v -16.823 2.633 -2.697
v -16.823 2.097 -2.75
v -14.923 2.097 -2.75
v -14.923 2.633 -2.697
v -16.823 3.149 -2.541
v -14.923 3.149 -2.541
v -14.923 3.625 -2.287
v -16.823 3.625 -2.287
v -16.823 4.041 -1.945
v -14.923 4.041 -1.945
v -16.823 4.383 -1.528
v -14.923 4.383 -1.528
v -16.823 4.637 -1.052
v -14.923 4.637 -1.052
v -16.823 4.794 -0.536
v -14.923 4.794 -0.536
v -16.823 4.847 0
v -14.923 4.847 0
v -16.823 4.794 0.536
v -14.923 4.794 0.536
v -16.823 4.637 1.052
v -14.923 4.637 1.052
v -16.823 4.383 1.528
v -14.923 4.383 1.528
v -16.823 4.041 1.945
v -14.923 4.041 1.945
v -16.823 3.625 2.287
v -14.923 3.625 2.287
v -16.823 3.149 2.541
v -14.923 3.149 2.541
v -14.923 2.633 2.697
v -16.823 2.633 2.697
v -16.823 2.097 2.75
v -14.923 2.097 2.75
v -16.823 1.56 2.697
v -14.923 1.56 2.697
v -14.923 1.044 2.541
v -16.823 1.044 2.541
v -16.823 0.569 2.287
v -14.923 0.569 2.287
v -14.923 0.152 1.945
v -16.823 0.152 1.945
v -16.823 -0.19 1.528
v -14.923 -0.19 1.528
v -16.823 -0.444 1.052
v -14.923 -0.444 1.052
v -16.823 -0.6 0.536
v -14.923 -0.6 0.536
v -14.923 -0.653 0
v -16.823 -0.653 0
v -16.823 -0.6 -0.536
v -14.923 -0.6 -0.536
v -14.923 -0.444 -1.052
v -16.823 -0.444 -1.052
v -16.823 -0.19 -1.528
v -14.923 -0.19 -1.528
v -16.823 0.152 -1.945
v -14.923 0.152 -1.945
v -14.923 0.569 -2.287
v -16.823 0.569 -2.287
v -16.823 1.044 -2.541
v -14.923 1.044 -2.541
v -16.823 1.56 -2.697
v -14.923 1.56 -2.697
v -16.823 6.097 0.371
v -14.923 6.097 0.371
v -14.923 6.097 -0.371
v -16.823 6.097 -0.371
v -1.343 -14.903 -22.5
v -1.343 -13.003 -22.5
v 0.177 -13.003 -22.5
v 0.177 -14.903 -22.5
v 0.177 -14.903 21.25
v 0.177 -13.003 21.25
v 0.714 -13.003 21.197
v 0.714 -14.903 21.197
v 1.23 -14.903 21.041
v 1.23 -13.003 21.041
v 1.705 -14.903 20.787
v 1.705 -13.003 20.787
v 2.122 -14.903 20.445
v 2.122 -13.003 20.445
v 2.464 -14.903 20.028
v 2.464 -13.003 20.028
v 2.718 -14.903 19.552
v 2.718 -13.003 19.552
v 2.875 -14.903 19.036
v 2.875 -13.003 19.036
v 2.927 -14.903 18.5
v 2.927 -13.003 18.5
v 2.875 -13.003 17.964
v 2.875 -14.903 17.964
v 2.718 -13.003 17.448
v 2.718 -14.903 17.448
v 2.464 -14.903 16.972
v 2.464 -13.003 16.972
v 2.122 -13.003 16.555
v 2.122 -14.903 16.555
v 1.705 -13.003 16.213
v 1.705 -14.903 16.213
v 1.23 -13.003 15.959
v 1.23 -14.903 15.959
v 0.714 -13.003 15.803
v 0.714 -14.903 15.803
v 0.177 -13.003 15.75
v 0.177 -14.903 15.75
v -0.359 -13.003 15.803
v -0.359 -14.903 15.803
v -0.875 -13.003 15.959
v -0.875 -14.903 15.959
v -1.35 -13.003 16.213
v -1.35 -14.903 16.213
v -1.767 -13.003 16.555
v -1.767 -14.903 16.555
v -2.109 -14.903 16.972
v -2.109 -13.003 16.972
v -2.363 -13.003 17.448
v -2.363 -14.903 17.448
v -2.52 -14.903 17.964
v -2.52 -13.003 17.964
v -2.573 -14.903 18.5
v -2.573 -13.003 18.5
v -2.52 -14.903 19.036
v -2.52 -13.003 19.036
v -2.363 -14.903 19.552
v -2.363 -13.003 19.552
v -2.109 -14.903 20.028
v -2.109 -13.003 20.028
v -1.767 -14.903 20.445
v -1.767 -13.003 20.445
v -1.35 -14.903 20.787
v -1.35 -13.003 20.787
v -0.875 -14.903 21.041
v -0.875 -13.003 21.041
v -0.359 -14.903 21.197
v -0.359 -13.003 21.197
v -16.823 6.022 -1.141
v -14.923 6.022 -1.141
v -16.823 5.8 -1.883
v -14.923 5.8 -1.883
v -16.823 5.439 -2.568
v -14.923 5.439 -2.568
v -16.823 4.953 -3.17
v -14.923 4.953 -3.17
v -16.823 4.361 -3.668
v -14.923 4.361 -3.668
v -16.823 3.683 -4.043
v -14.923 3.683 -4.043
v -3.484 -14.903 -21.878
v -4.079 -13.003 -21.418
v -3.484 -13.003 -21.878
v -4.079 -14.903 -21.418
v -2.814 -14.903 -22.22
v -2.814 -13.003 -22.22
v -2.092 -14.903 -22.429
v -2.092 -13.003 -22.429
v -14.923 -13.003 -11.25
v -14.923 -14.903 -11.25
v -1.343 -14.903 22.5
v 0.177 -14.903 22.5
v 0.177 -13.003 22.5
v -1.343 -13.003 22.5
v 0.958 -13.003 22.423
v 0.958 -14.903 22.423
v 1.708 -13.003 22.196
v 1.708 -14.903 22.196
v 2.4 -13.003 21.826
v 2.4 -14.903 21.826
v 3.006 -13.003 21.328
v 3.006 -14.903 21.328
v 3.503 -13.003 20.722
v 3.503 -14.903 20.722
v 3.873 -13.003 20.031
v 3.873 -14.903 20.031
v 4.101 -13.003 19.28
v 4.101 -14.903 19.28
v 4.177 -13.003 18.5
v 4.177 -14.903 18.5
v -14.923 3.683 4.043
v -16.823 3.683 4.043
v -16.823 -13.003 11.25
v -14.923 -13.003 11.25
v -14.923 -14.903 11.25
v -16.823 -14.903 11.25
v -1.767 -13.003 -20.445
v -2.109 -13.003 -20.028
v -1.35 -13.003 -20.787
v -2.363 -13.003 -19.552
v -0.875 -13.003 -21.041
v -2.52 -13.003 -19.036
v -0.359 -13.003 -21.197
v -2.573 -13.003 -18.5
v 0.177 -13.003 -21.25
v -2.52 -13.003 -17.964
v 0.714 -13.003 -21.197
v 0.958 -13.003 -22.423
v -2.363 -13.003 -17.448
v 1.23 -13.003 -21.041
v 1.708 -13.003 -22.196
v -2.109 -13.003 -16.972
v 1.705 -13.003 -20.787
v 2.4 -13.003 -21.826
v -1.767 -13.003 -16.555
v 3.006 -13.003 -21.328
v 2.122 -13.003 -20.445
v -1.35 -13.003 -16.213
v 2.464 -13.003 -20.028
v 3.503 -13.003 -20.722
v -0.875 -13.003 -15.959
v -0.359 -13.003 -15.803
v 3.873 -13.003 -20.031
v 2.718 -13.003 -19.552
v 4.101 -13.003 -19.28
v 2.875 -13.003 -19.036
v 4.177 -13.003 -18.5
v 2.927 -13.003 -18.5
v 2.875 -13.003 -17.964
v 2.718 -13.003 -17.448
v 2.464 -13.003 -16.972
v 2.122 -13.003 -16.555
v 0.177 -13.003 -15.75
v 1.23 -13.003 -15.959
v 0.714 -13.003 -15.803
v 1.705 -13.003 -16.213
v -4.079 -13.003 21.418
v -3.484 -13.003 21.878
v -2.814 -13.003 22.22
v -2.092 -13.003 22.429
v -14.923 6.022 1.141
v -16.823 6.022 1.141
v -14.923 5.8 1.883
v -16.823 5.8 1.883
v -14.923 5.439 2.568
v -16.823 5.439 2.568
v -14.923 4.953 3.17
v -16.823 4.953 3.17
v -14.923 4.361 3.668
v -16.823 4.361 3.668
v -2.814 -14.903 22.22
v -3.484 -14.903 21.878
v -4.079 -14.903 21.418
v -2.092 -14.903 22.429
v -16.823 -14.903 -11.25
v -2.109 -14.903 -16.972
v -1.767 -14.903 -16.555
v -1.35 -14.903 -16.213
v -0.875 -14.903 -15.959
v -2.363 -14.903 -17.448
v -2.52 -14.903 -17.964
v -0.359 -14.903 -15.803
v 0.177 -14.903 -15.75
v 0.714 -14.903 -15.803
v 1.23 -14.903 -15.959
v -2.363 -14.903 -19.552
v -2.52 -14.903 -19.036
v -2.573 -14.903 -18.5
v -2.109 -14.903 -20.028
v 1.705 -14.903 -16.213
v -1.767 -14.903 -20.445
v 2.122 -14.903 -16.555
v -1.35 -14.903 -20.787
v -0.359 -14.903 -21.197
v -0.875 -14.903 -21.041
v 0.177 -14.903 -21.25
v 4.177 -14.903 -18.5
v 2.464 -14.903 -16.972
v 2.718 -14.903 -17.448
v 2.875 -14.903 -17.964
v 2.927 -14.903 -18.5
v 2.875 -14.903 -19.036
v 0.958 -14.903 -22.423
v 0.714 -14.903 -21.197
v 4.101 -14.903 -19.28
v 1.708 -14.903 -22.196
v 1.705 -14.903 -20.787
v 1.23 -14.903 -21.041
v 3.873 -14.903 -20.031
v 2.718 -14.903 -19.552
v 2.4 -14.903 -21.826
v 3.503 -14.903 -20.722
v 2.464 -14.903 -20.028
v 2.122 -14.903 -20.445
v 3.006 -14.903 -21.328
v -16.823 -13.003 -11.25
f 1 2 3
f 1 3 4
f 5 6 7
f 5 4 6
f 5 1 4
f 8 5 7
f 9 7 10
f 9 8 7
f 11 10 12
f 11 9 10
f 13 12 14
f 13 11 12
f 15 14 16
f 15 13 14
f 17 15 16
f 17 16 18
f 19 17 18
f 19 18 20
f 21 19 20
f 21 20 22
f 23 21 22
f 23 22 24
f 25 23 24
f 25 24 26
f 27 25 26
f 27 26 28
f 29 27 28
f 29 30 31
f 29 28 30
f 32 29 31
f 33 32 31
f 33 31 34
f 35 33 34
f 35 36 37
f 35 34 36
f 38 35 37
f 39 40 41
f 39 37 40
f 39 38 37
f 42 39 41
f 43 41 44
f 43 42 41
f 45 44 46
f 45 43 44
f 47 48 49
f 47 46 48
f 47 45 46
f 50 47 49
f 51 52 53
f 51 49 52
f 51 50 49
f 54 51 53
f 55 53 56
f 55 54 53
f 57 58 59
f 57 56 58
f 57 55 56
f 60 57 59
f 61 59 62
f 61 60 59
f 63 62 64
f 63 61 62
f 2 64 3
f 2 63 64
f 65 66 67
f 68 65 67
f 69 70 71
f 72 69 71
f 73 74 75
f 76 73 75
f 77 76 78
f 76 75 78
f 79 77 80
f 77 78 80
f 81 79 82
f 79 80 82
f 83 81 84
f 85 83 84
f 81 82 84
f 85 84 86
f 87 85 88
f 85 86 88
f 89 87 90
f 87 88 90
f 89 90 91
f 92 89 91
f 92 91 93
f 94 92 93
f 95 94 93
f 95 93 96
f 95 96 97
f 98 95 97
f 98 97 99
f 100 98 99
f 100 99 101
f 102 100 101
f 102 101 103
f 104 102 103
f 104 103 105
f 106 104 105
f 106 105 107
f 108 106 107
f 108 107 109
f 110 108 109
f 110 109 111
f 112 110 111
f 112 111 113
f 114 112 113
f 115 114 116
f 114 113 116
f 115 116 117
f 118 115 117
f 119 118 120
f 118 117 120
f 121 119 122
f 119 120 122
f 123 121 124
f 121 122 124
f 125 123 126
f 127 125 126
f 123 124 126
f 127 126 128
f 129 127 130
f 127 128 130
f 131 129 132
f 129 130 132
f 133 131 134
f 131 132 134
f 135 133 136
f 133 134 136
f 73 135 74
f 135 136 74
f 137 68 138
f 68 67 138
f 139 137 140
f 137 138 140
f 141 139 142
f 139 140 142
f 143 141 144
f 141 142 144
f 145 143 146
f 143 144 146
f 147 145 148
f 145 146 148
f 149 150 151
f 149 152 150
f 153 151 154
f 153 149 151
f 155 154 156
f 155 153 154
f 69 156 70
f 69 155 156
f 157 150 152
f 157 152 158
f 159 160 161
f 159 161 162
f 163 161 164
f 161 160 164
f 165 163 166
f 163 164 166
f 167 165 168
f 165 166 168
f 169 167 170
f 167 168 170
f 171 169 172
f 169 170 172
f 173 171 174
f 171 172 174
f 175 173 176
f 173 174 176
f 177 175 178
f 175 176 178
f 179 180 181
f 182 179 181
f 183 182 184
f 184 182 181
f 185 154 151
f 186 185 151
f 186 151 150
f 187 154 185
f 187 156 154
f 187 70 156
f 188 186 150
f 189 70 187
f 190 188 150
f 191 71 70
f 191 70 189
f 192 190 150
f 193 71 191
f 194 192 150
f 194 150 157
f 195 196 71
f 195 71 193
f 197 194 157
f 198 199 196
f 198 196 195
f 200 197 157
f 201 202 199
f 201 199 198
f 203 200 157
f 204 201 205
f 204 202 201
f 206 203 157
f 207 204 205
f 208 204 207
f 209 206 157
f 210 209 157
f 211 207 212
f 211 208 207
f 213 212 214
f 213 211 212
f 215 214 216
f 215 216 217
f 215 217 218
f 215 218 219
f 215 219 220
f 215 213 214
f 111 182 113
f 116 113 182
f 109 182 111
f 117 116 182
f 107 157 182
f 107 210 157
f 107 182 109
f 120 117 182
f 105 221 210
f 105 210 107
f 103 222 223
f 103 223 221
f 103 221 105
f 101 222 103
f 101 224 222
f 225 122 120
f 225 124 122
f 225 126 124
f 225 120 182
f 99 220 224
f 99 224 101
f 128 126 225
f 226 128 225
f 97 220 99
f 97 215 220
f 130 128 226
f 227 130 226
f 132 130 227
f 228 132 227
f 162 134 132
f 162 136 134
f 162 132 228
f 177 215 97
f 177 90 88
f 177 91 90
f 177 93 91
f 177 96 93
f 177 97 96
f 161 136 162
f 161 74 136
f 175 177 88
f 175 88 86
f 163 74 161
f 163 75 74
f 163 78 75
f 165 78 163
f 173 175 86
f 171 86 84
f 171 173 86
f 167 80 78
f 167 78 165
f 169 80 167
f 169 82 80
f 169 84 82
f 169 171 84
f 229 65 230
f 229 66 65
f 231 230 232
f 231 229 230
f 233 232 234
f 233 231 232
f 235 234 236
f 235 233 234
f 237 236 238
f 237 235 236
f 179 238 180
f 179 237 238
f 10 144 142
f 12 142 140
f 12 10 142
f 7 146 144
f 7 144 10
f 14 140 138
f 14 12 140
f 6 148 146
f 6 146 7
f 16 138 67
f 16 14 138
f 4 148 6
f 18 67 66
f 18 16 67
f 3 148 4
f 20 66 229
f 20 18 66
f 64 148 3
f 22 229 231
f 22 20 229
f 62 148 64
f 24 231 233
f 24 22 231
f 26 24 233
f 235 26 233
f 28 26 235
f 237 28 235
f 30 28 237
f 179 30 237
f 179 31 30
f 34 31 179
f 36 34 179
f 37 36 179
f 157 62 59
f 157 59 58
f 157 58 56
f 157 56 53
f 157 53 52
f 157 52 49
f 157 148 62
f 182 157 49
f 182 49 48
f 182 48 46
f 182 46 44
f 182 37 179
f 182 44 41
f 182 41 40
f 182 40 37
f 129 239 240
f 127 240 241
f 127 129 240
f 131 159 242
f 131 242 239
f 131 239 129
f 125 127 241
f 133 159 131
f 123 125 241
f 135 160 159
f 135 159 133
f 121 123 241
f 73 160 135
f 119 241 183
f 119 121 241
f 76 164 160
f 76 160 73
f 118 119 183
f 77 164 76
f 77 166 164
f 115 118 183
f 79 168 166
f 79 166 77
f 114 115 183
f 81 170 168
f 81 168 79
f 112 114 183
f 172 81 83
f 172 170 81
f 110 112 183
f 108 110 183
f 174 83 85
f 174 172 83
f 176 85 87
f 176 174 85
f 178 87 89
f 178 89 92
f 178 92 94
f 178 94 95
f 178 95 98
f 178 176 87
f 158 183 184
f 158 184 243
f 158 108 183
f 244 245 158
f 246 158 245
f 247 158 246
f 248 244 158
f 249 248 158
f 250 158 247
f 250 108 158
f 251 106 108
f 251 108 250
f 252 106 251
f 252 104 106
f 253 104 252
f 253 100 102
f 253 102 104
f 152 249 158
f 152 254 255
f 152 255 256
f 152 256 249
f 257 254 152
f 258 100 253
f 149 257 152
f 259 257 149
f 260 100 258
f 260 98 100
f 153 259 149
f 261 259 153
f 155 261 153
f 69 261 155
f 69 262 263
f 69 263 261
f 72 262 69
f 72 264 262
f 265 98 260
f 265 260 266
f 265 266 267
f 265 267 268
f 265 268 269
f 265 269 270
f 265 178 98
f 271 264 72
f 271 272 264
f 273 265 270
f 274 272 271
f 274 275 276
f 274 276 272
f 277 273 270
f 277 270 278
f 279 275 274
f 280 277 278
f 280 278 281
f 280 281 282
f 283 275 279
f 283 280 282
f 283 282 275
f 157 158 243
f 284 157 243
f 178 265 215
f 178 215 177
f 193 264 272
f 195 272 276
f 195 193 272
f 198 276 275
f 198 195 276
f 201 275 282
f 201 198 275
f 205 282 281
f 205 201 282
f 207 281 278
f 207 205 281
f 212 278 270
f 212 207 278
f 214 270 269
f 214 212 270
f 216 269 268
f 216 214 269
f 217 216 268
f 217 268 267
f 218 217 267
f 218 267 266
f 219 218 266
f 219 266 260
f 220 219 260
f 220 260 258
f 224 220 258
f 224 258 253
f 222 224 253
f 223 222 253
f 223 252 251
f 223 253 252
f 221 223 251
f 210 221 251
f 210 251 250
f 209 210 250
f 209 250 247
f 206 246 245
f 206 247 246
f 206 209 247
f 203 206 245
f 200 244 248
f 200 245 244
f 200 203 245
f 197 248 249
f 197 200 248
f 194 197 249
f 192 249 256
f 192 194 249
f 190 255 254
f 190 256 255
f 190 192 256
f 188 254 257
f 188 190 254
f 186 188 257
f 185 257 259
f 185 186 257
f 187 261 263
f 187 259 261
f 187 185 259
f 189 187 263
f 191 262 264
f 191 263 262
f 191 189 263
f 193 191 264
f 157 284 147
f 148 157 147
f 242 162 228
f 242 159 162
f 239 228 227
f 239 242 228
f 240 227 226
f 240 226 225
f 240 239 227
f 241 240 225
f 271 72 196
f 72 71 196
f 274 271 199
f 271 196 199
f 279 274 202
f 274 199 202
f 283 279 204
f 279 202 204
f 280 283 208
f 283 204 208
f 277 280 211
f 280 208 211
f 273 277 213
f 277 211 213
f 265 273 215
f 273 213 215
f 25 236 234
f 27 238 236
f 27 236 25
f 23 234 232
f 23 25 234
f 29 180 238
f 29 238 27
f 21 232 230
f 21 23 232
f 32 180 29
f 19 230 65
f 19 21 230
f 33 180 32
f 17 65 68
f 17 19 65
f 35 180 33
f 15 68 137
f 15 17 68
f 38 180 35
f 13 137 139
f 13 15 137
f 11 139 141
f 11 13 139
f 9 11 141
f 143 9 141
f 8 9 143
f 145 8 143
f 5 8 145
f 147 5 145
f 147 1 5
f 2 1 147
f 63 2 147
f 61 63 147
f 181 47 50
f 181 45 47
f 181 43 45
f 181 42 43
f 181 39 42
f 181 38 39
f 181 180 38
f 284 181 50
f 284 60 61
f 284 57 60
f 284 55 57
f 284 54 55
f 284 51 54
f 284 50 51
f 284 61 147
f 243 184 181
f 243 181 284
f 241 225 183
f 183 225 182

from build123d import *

# Parameters (mm, degrees)
ESBO_O3_W                  = 45
ESBO_O3_H                  = 1.9
CORTE_EXTRUS_O1_DEPTH      = 34.063063068
CORTE_EXTRUS_O1_DEPTH_BACK = 34.063063068
ESBO_O4_R                  = 2.75
ESBO_O5_R                  = 2.75
CORTE_EXTRUS_O2_DEPTH      = 34.971447122
FILETE1_R                  = 4


with BuildPart() as part:
    # Varredura2: sweep along a path in Esboço1
    with BuildLine(Plane.XY) as varredura2_path:
        Line((-16.822580645, 6.096774194), (-16.822580645, -14.903225806))
        Line((-16.822580645, -14.903225806), (4.177419355, -14.903225806))
    # Esboço3 → Varredura2 (sweep)
    with BuildSketch(Plane(origin=(4.177419355, 0, 0), x_dir=(0, 0, -1), z_dir=(1, 0, 0))):
        with Locations((0, -13.953225806)):
            Rectangle(ESBO_O3_W, ESBO_O3_H)
    sweep(path=varredura2_path.line, transition=Transition.RIGHT)

    # Esboço4 → Corte-extrusão1 (cut, two sides: drawn at the far end of the back side and taken through both)
    with BuildSketch(Plane(origin=(-14.922580645, 0, 0), x_dir=(0, 0, -1), z_dir=(1, 0, 0)).offset(-CORTE_EXTRUS_O1_DEPTH_BACK)):
        with Locations((0, 2.096774194)):
            Circle(ESBO_O4_R)
        Polygon((0, 6.096774194), (-3, 6.096774194), (-11.25, -13.003225806), (-24.249816644, -13.003225806), (-24.249816644, 8.86202898), (24.249816644, 8.86202898), (24.249816644, -13.003225806), (11.25, -13.003225806), (3, 6.096774194), align=None)
    extrude(amount=CORTE_EXTRUS_O1_DEPTH + CORTE_EXTRUS_O1_DEPTH_BACK, mode=Mode.SUBTRACT)

    # Esboço5 → Corte-extrusão2 (cut, symmetric)
    with BuildSketch(Plane(origin=(0, -13.003225806, 0), x_dir=(1, 0, 0), z_dir=(0, 1, 0))):
        with Locations(Location((0.177419355, -18.5, 0), (0, 0, 270))):
            Circle(ESBO_O5_R)
        Polygon((-14.922580645, -11.25), (-18.889664127, -11.25), (-18.889664127, -25.413435485), (7.454666431, -25.413435485), (7.454666431, -2.187603421), (4.177419355, -2.187603421), (4.177419355, -22.5), (-2.92481363, -22.5), align=None)
    corte_extrus_o2 = extrude(amount=CORTE_EXTRUS_O2_DEPTH, both=True, mode=Mode.SUBTRACT)

    # Espelhar1: Corte-extrusão2 across plane
    add(corte_extrus_o2.mirror(Plane.XY), mode=Mode.SUBTRACT)

    # Filete1
    filete1_edges = [part.edges().sort_by_distance(p)[0] for p in [
        (4.177419355, -13.953225806, -22.5),
        (4.177419355, -13.953225806, 22.5),
        (-2.92481363, -13.953225806, -22.5),
        (-15.872580645, 6.096774194, -3),
        (-15.872580645, 6.096774194, 3),
        (-2.92481363, -13.953225806, 22.5),
    ]]
    fillet(filete1_edges, radius=FILETE1_R)


solid = part.part
